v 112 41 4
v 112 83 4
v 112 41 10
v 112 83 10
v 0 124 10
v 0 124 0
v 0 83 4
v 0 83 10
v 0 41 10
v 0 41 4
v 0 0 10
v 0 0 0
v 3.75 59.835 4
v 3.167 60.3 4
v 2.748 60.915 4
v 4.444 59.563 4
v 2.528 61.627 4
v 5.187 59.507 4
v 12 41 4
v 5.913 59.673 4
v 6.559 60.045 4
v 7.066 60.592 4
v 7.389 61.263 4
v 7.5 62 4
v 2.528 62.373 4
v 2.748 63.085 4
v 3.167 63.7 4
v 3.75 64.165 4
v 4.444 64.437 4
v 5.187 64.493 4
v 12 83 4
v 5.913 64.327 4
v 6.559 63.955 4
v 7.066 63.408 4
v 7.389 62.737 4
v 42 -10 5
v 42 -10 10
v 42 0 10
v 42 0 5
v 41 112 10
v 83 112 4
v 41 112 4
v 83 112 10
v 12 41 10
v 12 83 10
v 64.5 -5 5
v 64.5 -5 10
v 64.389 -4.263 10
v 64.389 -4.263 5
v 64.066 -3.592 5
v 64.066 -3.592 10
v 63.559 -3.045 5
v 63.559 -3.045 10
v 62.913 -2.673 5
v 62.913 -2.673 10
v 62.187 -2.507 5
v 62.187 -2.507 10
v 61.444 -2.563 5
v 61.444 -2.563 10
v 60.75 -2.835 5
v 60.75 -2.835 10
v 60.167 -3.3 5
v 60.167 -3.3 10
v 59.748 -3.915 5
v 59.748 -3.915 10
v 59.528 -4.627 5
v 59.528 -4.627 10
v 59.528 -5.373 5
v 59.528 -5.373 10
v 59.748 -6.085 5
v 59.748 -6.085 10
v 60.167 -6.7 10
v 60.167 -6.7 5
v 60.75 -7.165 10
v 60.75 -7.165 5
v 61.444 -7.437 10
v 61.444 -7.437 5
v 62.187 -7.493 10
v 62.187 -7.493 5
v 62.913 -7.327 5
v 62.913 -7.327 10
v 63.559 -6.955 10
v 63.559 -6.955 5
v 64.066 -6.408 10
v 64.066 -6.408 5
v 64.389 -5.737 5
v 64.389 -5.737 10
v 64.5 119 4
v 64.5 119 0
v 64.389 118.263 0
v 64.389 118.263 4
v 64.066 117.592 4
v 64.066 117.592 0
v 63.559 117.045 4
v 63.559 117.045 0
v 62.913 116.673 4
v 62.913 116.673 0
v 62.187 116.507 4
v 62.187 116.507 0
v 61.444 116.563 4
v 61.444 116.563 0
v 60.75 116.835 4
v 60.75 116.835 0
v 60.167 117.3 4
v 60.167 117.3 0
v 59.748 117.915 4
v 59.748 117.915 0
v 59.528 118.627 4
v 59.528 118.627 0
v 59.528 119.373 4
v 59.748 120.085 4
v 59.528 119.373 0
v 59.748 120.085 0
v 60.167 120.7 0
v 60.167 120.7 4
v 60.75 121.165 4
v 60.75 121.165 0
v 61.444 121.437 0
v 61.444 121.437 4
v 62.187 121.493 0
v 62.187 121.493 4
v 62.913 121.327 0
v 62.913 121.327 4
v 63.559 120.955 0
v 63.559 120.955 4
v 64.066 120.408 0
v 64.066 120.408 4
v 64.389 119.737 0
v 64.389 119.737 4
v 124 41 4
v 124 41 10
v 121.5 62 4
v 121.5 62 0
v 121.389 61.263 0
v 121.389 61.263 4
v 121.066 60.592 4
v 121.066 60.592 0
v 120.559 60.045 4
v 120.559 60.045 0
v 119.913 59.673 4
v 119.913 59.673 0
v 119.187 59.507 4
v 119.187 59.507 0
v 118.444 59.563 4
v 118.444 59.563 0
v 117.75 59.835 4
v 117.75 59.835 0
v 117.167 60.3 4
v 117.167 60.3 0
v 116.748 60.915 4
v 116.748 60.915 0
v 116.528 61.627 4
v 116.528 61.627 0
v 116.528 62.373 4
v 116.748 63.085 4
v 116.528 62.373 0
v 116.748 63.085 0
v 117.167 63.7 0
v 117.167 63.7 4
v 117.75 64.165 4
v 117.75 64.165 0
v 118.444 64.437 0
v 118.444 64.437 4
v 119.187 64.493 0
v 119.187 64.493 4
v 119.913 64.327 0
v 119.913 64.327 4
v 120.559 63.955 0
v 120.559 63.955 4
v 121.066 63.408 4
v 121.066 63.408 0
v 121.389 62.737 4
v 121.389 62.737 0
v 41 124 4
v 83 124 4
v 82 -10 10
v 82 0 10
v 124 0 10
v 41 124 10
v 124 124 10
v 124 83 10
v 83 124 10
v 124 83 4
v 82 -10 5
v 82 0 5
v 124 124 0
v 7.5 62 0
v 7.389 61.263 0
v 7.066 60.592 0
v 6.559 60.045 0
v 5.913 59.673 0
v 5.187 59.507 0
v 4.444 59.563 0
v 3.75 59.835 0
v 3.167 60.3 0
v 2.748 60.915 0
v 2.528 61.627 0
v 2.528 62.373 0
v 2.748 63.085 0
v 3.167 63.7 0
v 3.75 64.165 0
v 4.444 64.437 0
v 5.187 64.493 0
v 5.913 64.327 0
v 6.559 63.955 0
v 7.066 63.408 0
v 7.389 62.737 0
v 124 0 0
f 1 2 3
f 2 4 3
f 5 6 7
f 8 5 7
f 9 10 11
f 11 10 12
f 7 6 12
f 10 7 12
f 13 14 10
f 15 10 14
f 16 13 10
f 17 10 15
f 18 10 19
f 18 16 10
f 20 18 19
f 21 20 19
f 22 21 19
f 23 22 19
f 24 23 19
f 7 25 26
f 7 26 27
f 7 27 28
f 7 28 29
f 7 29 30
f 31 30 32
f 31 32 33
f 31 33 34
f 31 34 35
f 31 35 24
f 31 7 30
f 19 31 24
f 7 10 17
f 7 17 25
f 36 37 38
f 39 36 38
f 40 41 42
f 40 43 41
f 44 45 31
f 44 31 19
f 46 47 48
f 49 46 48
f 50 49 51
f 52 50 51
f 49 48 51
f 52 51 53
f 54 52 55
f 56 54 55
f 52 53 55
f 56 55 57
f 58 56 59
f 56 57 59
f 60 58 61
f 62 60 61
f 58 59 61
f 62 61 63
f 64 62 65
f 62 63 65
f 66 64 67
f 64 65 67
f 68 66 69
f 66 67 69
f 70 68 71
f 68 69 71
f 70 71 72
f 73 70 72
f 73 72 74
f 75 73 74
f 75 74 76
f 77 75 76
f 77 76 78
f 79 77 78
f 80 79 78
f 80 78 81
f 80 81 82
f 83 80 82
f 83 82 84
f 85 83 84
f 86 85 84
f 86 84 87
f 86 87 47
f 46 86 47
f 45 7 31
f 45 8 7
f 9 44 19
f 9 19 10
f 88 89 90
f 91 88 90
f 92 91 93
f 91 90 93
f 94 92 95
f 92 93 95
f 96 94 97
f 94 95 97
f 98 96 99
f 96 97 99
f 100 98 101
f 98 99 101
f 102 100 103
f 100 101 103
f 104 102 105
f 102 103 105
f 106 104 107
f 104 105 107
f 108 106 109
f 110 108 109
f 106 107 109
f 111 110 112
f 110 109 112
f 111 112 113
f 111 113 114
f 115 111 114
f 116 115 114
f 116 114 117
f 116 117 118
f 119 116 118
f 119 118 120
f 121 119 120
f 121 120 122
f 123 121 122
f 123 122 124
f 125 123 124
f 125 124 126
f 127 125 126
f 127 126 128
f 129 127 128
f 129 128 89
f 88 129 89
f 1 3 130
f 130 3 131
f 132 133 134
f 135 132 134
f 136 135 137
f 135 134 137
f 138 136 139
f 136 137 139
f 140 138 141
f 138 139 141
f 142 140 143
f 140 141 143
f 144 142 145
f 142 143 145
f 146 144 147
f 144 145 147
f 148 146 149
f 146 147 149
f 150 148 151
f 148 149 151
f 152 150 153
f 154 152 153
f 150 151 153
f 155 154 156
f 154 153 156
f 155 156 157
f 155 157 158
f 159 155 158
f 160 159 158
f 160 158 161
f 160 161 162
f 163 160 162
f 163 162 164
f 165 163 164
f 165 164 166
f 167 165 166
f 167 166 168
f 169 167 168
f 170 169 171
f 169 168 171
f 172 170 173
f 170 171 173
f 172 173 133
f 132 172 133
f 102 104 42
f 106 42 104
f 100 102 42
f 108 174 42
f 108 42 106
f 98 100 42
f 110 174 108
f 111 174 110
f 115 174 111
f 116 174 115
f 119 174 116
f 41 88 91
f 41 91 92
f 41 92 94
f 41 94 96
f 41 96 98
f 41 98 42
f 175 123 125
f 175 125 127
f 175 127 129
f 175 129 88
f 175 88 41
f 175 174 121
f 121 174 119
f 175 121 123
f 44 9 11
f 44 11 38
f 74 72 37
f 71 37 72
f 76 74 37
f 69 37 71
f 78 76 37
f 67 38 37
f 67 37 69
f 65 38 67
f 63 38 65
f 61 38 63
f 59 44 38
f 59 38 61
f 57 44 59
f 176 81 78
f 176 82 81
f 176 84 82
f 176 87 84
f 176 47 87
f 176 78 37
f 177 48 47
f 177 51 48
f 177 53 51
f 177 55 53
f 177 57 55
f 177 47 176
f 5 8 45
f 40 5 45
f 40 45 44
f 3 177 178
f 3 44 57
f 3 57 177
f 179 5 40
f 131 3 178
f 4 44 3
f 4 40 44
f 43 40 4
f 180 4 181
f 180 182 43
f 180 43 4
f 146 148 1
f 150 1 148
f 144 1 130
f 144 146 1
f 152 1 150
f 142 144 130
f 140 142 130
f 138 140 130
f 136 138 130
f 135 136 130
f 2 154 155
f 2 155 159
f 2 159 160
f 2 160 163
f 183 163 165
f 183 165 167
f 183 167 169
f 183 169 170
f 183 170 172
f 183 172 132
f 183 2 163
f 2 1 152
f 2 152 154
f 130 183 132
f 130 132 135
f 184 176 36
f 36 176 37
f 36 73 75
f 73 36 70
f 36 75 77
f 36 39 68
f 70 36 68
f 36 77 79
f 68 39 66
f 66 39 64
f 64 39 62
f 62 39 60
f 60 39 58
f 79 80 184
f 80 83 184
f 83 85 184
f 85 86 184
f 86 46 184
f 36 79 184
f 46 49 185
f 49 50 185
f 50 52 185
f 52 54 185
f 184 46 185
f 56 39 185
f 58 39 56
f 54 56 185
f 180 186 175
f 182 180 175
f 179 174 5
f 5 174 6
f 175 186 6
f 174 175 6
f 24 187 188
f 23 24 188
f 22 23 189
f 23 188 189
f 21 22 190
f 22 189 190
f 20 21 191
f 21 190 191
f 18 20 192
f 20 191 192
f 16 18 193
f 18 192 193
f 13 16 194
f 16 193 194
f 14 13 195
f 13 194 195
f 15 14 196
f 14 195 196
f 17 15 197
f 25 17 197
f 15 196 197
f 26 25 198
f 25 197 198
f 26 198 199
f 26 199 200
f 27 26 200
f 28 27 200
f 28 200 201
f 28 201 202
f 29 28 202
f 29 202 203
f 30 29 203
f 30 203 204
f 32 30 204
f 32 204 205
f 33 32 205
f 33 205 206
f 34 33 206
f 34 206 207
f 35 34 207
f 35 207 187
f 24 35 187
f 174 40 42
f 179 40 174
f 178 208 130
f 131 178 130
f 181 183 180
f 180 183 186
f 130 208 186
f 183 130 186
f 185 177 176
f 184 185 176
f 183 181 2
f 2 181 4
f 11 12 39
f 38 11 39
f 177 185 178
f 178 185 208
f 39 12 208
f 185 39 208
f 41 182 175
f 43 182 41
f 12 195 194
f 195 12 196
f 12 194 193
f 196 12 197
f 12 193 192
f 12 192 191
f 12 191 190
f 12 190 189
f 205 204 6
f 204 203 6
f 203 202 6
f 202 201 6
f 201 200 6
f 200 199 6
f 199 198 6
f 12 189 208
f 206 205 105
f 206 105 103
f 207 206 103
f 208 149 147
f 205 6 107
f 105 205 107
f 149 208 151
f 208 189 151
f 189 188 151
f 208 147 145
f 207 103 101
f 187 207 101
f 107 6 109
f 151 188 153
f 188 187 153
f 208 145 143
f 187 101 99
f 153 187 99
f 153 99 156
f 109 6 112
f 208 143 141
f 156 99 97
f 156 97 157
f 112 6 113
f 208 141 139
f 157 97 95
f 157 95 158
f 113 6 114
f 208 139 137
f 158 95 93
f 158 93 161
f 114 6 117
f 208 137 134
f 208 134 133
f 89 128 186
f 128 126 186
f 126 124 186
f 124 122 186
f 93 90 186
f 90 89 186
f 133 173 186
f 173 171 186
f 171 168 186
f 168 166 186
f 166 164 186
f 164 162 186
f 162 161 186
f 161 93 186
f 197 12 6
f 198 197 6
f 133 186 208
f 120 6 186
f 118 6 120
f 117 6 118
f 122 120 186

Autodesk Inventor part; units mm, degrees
ref_plane "YZ Plane" through (0, 0, 0) normal (1, 0, 0) x (0, 1, 0)
ref_plane "XZ Plane" through (0, 0, 0) normal (0, 1, 0) x (-1, 0, 0)
ref_plane "XY Plane" through (0, 0, 0) normal (0, 0, 1) x (1, 0, 0)
sketch "Sketch1" plane through (0, 0, 0) normal (0, 0, 1) x (1, 0, 0)
  line L0 (0, 0) -> (124, 0)
  line L1 (124, 0) -> (124, 124)
  line L2 (124, 124) -> (0, 124)
  line L3 (0, 124) -> (0, 0)
  circle A0 centre (5, 62) radius 2.5
  circle A1 centre (119, 62) radius 2.5
  circle A2 centre (62, 119) radius 2.5
  point P0 (124, 62)
  point P1 (0, 62)
  point P2 (62, 124)
  dimension "d0" = 124
  dimension "d1" = 124
  dimension "d2" = 5
  dimension "d3" = 5
  dimension "d4" = 5
  dimension "d5" = 5
  dimension "d6" = 5
  dimension "d7" = 5
extrude "Extrusion1" add sketch "Sketch1" along normal blind 10
sketch "Sketch2" plane through (0, 0, 10) normal (0, 0, 1) x (1, 0, 0)
  line L0 (0, 83) -> (12, 83)
  line L1 (12, 83) -> (12, 41)
  line L2 (12, 41) -> (0, 41)
  line L3 (0, 41) -> (0, 83)
  line L4 (124, 124) -> (0, 124) projected
  line L5 (41, 124) -> (83, 124)
  line L6 (83, 124) -> (83, 112)
  line L7 (83, 112) -> (41, 112)
  line L8 (41, 112) -> (41, 124)
  line L9 (124, 0) -> (124, 124) projected
  line L10 (124, 83) -> (112, 83)
  line L11 (112, 83) -> (112, 41)
  line L12 (112, 41) -> (124, 41)
  line L13 (124, 41) -> (124, 83)
  line L14 (0, 124) -> (0, 0) projected
  point P0 (62, 112)
  point P1 (62, 124)
  point P2 (112, 62)
  point P3 (124, 62)
  point P4 (12, 62)
  point P5 (0, 62)
  dimension "d10" = 12
  dimension "d11" = 42
  dimension "d12" = 42
  dimension "d13" = 12
  dimension "d14" = 12
  dimension "d15" = 42
extrude "Extrusion2" cut sketch "Sketch2" against normal blind 6
sketch "Sketch3" plane through (0, 0, 10) normal (0, 0, 1) x (1, 0, 0)
  line L0 (0, 0) -> (124, 0) projected
  line L1 (42, 0) -> (82, 0)
  line L2 (82, 0) -> (82, -10)
  line L3 (82, -10) -> (42, -10)
  line L4 (42, -10) -> (42, 0)
  circle A0 centre (62, -5) radius 2.5
  point P0 (42, -5)
  point P1 (62, -10)
  point P2 (62, 0)
  point P3 (62, 0)
  dimension "d18" = 40
  dimension "d19" = 10
  dimension "d20" = 5
extrude "Extrusion3" add sketch "Sketch3" against normal blind 5
properties part number "TC007" material "ABS Plastic"
